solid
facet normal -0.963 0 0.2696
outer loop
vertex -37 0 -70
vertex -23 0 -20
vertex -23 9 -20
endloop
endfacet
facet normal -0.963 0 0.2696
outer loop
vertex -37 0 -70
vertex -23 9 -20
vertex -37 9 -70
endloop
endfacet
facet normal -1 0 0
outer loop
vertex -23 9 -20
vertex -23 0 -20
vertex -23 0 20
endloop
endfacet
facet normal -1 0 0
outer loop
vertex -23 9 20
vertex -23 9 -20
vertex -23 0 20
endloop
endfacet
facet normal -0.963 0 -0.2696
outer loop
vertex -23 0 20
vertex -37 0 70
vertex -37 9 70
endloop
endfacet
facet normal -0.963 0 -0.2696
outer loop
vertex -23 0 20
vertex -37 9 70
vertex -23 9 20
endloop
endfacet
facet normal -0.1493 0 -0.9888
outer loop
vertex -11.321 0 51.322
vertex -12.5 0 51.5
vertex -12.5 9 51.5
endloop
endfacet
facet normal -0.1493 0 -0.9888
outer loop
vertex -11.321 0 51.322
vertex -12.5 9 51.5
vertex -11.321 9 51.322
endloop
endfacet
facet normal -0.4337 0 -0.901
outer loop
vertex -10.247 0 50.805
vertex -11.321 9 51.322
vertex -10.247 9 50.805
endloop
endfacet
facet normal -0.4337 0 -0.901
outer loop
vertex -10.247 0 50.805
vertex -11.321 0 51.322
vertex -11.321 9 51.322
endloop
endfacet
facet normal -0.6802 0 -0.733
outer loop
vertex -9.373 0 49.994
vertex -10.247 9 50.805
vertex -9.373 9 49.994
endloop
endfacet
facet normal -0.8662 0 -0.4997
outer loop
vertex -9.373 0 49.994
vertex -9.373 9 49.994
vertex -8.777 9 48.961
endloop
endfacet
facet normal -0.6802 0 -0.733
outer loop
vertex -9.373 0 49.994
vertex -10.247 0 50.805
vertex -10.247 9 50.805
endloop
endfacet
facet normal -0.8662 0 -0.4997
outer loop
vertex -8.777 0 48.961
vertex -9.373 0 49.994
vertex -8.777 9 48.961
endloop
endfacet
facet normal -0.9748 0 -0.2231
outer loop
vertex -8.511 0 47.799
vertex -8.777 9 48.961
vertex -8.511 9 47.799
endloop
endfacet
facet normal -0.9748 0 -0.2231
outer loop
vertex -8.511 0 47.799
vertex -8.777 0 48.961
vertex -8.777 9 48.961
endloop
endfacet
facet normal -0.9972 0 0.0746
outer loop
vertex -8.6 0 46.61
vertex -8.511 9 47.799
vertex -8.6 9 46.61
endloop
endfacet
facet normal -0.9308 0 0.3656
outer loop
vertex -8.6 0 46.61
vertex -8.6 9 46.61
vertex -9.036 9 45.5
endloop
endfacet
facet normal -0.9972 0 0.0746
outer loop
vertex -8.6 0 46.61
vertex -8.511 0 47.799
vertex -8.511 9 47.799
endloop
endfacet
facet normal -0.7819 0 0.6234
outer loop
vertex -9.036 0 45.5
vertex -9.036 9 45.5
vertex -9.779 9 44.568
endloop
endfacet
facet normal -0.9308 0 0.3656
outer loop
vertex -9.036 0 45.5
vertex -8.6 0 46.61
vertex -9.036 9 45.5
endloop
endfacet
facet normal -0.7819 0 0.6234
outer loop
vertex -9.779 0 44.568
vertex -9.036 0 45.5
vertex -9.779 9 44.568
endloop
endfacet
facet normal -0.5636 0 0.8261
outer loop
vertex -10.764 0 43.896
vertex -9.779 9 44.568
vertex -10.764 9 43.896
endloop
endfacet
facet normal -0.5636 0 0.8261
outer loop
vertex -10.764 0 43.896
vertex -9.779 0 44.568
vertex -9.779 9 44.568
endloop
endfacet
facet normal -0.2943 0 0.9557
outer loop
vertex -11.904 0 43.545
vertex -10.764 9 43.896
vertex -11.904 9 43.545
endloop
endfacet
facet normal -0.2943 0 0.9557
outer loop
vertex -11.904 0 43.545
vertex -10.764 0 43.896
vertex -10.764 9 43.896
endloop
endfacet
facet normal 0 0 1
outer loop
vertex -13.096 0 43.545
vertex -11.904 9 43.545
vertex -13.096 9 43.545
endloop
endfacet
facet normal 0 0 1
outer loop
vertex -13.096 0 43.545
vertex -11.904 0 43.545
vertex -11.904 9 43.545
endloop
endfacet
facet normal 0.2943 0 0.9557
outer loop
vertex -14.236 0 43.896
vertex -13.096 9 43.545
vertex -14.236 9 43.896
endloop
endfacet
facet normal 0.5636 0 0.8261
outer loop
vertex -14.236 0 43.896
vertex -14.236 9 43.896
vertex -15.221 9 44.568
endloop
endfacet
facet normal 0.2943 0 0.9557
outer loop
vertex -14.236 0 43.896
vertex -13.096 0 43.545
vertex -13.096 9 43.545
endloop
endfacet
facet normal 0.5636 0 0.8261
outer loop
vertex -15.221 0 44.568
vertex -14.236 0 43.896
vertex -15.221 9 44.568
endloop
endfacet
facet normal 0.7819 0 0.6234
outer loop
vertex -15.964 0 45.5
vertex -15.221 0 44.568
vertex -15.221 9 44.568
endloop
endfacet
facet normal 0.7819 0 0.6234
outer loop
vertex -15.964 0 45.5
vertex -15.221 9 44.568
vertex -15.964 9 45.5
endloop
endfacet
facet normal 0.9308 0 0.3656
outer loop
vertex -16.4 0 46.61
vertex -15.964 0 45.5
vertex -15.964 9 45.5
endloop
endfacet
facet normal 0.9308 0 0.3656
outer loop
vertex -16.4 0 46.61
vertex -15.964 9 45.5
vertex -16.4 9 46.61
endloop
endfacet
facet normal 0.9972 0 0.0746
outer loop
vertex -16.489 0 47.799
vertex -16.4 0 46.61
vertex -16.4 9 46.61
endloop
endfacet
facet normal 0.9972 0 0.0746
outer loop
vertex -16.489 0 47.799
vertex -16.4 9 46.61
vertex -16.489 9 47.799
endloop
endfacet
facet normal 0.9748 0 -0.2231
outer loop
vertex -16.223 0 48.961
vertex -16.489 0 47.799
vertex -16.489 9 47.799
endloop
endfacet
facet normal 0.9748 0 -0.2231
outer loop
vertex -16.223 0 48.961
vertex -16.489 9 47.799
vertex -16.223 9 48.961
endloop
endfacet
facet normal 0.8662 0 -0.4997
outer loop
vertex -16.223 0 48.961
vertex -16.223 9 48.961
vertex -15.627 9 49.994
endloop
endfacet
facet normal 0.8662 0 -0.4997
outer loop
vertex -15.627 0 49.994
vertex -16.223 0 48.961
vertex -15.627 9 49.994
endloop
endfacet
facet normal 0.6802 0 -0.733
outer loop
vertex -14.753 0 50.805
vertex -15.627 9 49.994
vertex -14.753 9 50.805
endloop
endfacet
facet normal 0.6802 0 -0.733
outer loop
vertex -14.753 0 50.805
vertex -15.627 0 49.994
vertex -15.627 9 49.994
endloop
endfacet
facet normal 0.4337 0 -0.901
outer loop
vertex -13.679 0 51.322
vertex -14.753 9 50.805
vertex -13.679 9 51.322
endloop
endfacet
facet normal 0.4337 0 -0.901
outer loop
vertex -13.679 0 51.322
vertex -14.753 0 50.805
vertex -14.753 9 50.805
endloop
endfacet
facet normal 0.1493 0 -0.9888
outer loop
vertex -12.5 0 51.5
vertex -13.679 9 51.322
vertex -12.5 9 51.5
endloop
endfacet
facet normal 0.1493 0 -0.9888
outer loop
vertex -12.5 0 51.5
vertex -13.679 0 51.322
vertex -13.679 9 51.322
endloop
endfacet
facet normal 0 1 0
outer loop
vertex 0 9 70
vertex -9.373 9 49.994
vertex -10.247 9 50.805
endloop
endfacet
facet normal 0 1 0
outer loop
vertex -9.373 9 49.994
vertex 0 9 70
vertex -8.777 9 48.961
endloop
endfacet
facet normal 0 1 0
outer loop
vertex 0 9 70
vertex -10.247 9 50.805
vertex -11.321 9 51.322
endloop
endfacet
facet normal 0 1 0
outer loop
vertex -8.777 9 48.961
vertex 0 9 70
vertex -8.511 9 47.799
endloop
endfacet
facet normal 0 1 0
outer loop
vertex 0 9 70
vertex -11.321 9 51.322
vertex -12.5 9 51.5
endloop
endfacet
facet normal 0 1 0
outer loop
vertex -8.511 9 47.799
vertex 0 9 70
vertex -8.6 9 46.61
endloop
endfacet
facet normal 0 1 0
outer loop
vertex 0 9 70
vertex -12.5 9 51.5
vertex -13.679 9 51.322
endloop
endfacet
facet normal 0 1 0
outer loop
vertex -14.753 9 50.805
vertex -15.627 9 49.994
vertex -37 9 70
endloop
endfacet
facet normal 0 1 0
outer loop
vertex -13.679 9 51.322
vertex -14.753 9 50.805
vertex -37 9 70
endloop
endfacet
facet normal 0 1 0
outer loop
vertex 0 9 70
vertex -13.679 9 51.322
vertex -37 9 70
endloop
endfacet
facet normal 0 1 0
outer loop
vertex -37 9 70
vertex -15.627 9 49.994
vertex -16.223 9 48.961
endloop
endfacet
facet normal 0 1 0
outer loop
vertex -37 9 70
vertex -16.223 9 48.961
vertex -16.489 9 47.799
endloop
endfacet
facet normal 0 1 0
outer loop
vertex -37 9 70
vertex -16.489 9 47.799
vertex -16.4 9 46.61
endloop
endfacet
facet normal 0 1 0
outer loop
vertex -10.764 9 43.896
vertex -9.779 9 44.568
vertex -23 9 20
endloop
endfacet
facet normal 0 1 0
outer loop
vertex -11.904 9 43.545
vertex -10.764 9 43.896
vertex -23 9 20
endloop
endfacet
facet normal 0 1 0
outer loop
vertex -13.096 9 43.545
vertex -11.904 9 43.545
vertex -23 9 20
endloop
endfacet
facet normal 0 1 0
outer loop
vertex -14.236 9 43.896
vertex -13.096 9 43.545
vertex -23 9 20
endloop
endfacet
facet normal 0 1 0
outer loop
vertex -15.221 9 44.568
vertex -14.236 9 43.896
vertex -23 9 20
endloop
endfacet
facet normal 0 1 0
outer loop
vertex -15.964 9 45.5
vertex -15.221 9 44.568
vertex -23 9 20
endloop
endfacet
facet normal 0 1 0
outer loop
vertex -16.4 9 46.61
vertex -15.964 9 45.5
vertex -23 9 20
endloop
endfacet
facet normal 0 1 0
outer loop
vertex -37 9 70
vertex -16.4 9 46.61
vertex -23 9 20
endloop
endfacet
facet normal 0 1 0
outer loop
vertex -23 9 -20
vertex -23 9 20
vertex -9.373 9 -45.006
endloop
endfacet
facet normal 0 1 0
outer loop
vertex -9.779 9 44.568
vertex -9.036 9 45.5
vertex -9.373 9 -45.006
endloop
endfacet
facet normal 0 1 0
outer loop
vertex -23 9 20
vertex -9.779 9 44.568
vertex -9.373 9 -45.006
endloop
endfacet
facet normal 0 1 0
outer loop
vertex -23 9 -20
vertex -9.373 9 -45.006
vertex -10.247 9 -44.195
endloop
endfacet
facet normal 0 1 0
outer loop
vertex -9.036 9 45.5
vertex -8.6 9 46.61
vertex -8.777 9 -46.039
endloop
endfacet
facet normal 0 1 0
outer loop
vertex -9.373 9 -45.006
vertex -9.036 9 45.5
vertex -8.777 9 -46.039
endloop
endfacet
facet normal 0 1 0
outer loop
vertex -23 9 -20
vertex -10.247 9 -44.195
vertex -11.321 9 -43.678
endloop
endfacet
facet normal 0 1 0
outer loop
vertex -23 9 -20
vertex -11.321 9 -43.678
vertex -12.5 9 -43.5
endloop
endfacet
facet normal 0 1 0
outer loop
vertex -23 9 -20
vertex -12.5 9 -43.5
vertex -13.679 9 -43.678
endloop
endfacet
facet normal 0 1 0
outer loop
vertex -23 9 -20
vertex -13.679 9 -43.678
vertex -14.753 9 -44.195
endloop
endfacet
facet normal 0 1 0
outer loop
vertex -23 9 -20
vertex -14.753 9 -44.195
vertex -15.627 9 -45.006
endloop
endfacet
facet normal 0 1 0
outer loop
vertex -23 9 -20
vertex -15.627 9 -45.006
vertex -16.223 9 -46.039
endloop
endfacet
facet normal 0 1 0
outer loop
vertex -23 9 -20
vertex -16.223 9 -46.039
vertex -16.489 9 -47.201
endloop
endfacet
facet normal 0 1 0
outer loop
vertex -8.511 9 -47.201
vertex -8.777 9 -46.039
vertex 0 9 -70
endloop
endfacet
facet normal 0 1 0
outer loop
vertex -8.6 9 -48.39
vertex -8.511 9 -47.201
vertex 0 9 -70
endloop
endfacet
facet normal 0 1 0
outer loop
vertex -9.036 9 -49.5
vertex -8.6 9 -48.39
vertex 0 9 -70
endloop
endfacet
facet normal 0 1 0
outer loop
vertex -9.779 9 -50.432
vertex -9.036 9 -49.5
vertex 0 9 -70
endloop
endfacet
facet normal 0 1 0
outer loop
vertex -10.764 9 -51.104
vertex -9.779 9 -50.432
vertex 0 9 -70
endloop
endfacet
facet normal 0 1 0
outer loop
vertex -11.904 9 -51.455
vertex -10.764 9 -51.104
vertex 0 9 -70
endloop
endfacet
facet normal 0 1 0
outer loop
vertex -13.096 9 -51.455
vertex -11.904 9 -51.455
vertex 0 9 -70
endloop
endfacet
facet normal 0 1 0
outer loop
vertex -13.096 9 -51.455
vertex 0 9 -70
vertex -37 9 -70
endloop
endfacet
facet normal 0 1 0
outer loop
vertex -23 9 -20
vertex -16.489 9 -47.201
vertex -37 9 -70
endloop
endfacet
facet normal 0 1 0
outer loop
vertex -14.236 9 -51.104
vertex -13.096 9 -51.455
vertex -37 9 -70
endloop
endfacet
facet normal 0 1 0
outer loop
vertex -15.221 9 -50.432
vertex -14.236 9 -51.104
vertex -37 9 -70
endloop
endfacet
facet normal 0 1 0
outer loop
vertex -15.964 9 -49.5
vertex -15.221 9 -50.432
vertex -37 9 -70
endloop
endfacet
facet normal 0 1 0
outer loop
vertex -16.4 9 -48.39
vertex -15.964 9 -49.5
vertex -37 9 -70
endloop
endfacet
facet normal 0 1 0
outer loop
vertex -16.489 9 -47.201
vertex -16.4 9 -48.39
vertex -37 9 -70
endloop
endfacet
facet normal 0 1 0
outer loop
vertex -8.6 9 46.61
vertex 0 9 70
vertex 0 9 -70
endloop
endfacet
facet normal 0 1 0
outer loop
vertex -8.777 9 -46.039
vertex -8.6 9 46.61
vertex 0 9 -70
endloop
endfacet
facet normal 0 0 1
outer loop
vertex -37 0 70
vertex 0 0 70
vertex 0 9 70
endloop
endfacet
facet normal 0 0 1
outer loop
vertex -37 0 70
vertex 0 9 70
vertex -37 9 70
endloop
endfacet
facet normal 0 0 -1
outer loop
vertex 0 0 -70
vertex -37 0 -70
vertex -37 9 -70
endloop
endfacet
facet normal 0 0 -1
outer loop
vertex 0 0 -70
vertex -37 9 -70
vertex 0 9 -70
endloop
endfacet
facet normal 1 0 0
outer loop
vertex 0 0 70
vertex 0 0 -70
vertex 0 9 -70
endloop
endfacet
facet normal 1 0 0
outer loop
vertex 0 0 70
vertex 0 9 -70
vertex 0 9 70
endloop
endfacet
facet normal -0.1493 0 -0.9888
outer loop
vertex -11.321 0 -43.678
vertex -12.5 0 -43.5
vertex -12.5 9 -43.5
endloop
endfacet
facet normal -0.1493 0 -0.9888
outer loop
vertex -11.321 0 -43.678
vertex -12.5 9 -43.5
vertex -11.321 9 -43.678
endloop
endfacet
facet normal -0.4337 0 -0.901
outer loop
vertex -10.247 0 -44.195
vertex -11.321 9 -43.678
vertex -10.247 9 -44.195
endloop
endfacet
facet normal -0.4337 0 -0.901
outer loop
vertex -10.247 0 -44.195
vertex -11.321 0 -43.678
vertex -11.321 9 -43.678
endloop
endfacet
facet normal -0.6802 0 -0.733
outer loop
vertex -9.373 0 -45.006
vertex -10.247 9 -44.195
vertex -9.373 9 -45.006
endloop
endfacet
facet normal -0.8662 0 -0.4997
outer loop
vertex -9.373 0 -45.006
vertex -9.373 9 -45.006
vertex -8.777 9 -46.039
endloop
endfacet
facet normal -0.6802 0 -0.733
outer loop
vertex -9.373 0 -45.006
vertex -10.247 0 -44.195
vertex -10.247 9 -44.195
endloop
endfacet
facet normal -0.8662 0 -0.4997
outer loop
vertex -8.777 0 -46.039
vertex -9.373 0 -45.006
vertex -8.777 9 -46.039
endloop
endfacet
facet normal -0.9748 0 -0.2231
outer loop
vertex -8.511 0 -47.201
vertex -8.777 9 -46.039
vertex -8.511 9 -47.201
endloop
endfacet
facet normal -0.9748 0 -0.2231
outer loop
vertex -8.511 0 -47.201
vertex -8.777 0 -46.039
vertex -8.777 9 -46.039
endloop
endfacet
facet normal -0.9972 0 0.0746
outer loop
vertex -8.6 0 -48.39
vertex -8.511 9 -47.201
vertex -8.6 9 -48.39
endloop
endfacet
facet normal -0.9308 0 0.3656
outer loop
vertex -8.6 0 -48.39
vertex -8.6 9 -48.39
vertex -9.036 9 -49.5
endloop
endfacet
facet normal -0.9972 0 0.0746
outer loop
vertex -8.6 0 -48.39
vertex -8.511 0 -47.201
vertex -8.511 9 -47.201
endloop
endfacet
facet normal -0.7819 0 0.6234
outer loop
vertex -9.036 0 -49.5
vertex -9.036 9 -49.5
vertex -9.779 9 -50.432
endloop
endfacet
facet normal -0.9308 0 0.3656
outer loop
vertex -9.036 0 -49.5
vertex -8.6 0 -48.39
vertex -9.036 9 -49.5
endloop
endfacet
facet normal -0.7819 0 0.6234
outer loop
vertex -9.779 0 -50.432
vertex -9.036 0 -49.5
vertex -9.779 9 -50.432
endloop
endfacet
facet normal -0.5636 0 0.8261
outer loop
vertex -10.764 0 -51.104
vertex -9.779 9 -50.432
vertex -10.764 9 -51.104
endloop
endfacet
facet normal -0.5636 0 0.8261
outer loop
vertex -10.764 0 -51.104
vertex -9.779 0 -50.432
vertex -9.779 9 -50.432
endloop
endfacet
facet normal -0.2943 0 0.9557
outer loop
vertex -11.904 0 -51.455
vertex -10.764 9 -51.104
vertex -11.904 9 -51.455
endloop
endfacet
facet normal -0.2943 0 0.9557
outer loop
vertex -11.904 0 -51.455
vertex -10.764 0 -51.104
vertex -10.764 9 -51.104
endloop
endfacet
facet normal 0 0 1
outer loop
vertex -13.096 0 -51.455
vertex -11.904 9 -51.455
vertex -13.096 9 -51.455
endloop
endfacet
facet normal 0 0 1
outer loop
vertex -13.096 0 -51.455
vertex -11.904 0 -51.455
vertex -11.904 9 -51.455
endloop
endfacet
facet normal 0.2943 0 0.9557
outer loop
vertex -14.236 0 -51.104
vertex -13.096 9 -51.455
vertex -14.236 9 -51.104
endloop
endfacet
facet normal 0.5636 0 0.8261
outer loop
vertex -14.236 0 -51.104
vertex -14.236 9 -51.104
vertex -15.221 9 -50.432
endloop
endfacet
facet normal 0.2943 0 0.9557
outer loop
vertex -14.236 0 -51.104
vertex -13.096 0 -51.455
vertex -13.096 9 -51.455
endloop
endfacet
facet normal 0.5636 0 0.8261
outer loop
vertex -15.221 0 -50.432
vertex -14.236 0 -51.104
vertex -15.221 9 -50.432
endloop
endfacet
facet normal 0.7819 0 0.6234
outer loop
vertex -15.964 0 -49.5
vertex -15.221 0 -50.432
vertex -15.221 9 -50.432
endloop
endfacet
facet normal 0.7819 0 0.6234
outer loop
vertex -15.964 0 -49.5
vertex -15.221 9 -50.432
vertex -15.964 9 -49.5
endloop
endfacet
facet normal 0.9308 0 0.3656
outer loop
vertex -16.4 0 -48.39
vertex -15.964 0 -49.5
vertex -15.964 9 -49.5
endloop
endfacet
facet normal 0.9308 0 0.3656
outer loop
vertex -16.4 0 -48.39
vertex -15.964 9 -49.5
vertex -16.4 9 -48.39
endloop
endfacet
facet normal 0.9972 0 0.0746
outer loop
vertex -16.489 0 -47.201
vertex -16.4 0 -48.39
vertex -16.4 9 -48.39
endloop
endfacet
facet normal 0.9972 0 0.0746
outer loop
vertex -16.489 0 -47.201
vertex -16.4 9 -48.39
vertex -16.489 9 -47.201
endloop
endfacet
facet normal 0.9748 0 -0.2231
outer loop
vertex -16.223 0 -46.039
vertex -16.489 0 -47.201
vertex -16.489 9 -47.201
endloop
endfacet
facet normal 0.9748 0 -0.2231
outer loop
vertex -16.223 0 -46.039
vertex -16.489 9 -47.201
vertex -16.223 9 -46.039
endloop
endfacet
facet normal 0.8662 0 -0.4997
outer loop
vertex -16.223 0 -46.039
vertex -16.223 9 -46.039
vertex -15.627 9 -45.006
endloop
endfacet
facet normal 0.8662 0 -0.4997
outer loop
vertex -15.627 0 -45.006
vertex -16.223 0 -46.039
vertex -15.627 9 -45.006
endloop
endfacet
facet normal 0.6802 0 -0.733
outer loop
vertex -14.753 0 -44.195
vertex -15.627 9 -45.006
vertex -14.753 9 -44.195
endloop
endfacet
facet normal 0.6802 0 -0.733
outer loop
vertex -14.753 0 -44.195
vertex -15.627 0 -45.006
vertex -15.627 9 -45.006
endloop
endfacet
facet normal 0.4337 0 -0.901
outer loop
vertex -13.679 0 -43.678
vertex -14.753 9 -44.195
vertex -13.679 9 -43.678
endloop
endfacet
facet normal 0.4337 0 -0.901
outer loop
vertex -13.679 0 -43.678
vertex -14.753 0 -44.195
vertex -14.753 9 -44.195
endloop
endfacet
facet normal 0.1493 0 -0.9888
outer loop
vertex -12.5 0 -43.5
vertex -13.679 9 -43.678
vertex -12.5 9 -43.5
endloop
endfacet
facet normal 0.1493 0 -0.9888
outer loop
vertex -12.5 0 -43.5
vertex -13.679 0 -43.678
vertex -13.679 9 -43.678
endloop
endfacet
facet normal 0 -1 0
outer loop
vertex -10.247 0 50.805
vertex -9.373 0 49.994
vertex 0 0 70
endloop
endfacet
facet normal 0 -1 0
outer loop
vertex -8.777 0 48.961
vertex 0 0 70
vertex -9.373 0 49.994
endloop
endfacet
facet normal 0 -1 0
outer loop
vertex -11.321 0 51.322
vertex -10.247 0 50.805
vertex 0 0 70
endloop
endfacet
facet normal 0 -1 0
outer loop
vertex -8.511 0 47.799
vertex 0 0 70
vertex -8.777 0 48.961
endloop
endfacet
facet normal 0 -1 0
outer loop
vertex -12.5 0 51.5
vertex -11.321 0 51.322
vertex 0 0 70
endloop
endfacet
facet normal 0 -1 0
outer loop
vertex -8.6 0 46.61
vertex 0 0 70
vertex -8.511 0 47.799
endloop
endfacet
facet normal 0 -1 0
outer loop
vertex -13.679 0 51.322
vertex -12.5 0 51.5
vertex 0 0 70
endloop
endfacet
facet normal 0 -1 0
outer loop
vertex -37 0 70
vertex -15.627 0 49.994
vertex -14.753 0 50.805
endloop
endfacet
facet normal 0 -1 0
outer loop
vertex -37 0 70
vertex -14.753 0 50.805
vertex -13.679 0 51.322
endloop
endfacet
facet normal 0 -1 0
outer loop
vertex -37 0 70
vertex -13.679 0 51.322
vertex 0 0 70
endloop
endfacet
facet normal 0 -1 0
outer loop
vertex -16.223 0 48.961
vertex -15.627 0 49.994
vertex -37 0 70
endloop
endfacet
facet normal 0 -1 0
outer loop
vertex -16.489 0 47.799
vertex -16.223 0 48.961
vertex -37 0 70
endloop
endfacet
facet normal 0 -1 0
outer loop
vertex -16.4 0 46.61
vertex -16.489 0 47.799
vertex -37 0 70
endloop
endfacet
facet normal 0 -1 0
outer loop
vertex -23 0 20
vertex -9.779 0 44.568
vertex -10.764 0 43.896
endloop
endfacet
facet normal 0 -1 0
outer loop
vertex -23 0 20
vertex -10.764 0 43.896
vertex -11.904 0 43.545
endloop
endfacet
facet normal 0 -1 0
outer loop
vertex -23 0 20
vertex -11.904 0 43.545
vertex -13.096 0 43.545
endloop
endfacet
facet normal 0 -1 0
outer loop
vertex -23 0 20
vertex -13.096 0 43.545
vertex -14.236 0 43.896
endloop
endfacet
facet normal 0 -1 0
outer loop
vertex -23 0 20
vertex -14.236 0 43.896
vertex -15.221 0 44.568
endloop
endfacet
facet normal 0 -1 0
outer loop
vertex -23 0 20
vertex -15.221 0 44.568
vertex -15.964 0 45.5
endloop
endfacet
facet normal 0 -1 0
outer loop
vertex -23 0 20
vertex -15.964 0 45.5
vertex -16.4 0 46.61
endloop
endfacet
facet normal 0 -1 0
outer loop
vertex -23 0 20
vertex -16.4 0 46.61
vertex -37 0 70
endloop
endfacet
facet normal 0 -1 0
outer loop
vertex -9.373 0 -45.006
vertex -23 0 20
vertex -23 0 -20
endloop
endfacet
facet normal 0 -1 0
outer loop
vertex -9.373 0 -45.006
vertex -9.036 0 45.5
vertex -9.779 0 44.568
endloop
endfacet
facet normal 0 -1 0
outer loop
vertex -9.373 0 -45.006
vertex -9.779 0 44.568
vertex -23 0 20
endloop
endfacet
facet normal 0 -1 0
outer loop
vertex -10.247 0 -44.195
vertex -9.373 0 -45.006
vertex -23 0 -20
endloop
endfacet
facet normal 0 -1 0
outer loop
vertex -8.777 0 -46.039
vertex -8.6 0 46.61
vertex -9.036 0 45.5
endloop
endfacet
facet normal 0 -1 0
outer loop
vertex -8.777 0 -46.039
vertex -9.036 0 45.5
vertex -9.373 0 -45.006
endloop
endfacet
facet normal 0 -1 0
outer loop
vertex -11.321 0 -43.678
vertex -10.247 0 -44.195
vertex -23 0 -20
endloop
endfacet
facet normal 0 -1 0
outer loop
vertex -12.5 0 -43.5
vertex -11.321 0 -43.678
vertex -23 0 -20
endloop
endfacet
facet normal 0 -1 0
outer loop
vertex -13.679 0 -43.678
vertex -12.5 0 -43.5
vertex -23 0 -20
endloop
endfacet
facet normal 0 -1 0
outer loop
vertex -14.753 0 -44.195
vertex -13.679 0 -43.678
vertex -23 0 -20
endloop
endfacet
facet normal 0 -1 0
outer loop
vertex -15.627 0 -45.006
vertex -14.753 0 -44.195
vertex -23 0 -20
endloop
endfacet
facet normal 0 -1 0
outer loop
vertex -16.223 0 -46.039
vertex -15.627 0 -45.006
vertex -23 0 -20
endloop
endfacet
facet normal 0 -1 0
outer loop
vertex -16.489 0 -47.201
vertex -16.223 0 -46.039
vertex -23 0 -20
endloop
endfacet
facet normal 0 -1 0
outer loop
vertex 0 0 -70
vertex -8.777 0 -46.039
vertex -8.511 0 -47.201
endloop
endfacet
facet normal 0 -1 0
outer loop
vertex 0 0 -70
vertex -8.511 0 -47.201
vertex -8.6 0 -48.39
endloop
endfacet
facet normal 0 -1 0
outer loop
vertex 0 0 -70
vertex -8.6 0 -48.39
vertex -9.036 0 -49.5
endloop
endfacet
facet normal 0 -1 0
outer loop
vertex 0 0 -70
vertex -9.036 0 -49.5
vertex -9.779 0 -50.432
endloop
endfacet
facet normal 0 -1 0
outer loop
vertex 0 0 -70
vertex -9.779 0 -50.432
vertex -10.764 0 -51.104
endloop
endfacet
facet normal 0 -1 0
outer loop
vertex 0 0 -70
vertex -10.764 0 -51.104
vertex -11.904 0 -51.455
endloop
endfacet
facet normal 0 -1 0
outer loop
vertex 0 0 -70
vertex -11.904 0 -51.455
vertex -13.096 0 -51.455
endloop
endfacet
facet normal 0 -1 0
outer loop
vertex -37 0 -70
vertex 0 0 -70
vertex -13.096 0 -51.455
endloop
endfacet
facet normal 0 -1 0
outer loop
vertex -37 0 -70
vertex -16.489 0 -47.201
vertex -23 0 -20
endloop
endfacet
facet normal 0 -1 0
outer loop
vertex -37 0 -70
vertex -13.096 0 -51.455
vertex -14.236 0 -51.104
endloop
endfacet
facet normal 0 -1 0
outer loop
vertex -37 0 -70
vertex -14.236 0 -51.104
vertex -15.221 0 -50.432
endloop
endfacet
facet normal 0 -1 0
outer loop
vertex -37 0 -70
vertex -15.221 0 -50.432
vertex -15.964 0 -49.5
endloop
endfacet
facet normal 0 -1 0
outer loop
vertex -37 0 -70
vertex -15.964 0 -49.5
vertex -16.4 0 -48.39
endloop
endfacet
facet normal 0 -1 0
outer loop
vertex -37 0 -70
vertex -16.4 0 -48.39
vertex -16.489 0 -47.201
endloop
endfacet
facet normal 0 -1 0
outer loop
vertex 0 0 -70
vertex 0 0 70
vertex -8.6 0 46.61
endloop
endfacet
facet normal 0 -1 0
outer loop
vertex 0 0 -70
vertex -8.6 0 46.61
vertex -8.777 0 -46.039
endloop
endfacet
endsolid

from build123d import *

# Parameters (mm, degrees)
SKETCH1_R           = 4
BOSS_EXTRUDE1_DEPTH = 9


with BuildPart() as part:
    # Sketch1 → Boss-Extrude1 (new body)
    with BuildSketch(Plane(origin=(0, 0, 0), x_dir=(1, 0, 0), z_dir=(0, 1, 0))):
        Polygon((0, 70), (0, -70), (-37, -70), (-23, -20), (-23, 0), (-23, 20), (-37, 70), align=None)
        with Locations(Location((-12.5, 47.5, 0), (0, 0, 270))):
            Circle(SKETCH1_R, mode=Mode.SUBTRACT)
        with Locations(Location((-12.5, -47.5, 0), (0, 0, 270))):
            Circle(SKETCH1_R, mode=Mode.SUBTRACT)
    extrude(amount=BOSS_EXTRUDE1_DEPTH)


solid = part.part
